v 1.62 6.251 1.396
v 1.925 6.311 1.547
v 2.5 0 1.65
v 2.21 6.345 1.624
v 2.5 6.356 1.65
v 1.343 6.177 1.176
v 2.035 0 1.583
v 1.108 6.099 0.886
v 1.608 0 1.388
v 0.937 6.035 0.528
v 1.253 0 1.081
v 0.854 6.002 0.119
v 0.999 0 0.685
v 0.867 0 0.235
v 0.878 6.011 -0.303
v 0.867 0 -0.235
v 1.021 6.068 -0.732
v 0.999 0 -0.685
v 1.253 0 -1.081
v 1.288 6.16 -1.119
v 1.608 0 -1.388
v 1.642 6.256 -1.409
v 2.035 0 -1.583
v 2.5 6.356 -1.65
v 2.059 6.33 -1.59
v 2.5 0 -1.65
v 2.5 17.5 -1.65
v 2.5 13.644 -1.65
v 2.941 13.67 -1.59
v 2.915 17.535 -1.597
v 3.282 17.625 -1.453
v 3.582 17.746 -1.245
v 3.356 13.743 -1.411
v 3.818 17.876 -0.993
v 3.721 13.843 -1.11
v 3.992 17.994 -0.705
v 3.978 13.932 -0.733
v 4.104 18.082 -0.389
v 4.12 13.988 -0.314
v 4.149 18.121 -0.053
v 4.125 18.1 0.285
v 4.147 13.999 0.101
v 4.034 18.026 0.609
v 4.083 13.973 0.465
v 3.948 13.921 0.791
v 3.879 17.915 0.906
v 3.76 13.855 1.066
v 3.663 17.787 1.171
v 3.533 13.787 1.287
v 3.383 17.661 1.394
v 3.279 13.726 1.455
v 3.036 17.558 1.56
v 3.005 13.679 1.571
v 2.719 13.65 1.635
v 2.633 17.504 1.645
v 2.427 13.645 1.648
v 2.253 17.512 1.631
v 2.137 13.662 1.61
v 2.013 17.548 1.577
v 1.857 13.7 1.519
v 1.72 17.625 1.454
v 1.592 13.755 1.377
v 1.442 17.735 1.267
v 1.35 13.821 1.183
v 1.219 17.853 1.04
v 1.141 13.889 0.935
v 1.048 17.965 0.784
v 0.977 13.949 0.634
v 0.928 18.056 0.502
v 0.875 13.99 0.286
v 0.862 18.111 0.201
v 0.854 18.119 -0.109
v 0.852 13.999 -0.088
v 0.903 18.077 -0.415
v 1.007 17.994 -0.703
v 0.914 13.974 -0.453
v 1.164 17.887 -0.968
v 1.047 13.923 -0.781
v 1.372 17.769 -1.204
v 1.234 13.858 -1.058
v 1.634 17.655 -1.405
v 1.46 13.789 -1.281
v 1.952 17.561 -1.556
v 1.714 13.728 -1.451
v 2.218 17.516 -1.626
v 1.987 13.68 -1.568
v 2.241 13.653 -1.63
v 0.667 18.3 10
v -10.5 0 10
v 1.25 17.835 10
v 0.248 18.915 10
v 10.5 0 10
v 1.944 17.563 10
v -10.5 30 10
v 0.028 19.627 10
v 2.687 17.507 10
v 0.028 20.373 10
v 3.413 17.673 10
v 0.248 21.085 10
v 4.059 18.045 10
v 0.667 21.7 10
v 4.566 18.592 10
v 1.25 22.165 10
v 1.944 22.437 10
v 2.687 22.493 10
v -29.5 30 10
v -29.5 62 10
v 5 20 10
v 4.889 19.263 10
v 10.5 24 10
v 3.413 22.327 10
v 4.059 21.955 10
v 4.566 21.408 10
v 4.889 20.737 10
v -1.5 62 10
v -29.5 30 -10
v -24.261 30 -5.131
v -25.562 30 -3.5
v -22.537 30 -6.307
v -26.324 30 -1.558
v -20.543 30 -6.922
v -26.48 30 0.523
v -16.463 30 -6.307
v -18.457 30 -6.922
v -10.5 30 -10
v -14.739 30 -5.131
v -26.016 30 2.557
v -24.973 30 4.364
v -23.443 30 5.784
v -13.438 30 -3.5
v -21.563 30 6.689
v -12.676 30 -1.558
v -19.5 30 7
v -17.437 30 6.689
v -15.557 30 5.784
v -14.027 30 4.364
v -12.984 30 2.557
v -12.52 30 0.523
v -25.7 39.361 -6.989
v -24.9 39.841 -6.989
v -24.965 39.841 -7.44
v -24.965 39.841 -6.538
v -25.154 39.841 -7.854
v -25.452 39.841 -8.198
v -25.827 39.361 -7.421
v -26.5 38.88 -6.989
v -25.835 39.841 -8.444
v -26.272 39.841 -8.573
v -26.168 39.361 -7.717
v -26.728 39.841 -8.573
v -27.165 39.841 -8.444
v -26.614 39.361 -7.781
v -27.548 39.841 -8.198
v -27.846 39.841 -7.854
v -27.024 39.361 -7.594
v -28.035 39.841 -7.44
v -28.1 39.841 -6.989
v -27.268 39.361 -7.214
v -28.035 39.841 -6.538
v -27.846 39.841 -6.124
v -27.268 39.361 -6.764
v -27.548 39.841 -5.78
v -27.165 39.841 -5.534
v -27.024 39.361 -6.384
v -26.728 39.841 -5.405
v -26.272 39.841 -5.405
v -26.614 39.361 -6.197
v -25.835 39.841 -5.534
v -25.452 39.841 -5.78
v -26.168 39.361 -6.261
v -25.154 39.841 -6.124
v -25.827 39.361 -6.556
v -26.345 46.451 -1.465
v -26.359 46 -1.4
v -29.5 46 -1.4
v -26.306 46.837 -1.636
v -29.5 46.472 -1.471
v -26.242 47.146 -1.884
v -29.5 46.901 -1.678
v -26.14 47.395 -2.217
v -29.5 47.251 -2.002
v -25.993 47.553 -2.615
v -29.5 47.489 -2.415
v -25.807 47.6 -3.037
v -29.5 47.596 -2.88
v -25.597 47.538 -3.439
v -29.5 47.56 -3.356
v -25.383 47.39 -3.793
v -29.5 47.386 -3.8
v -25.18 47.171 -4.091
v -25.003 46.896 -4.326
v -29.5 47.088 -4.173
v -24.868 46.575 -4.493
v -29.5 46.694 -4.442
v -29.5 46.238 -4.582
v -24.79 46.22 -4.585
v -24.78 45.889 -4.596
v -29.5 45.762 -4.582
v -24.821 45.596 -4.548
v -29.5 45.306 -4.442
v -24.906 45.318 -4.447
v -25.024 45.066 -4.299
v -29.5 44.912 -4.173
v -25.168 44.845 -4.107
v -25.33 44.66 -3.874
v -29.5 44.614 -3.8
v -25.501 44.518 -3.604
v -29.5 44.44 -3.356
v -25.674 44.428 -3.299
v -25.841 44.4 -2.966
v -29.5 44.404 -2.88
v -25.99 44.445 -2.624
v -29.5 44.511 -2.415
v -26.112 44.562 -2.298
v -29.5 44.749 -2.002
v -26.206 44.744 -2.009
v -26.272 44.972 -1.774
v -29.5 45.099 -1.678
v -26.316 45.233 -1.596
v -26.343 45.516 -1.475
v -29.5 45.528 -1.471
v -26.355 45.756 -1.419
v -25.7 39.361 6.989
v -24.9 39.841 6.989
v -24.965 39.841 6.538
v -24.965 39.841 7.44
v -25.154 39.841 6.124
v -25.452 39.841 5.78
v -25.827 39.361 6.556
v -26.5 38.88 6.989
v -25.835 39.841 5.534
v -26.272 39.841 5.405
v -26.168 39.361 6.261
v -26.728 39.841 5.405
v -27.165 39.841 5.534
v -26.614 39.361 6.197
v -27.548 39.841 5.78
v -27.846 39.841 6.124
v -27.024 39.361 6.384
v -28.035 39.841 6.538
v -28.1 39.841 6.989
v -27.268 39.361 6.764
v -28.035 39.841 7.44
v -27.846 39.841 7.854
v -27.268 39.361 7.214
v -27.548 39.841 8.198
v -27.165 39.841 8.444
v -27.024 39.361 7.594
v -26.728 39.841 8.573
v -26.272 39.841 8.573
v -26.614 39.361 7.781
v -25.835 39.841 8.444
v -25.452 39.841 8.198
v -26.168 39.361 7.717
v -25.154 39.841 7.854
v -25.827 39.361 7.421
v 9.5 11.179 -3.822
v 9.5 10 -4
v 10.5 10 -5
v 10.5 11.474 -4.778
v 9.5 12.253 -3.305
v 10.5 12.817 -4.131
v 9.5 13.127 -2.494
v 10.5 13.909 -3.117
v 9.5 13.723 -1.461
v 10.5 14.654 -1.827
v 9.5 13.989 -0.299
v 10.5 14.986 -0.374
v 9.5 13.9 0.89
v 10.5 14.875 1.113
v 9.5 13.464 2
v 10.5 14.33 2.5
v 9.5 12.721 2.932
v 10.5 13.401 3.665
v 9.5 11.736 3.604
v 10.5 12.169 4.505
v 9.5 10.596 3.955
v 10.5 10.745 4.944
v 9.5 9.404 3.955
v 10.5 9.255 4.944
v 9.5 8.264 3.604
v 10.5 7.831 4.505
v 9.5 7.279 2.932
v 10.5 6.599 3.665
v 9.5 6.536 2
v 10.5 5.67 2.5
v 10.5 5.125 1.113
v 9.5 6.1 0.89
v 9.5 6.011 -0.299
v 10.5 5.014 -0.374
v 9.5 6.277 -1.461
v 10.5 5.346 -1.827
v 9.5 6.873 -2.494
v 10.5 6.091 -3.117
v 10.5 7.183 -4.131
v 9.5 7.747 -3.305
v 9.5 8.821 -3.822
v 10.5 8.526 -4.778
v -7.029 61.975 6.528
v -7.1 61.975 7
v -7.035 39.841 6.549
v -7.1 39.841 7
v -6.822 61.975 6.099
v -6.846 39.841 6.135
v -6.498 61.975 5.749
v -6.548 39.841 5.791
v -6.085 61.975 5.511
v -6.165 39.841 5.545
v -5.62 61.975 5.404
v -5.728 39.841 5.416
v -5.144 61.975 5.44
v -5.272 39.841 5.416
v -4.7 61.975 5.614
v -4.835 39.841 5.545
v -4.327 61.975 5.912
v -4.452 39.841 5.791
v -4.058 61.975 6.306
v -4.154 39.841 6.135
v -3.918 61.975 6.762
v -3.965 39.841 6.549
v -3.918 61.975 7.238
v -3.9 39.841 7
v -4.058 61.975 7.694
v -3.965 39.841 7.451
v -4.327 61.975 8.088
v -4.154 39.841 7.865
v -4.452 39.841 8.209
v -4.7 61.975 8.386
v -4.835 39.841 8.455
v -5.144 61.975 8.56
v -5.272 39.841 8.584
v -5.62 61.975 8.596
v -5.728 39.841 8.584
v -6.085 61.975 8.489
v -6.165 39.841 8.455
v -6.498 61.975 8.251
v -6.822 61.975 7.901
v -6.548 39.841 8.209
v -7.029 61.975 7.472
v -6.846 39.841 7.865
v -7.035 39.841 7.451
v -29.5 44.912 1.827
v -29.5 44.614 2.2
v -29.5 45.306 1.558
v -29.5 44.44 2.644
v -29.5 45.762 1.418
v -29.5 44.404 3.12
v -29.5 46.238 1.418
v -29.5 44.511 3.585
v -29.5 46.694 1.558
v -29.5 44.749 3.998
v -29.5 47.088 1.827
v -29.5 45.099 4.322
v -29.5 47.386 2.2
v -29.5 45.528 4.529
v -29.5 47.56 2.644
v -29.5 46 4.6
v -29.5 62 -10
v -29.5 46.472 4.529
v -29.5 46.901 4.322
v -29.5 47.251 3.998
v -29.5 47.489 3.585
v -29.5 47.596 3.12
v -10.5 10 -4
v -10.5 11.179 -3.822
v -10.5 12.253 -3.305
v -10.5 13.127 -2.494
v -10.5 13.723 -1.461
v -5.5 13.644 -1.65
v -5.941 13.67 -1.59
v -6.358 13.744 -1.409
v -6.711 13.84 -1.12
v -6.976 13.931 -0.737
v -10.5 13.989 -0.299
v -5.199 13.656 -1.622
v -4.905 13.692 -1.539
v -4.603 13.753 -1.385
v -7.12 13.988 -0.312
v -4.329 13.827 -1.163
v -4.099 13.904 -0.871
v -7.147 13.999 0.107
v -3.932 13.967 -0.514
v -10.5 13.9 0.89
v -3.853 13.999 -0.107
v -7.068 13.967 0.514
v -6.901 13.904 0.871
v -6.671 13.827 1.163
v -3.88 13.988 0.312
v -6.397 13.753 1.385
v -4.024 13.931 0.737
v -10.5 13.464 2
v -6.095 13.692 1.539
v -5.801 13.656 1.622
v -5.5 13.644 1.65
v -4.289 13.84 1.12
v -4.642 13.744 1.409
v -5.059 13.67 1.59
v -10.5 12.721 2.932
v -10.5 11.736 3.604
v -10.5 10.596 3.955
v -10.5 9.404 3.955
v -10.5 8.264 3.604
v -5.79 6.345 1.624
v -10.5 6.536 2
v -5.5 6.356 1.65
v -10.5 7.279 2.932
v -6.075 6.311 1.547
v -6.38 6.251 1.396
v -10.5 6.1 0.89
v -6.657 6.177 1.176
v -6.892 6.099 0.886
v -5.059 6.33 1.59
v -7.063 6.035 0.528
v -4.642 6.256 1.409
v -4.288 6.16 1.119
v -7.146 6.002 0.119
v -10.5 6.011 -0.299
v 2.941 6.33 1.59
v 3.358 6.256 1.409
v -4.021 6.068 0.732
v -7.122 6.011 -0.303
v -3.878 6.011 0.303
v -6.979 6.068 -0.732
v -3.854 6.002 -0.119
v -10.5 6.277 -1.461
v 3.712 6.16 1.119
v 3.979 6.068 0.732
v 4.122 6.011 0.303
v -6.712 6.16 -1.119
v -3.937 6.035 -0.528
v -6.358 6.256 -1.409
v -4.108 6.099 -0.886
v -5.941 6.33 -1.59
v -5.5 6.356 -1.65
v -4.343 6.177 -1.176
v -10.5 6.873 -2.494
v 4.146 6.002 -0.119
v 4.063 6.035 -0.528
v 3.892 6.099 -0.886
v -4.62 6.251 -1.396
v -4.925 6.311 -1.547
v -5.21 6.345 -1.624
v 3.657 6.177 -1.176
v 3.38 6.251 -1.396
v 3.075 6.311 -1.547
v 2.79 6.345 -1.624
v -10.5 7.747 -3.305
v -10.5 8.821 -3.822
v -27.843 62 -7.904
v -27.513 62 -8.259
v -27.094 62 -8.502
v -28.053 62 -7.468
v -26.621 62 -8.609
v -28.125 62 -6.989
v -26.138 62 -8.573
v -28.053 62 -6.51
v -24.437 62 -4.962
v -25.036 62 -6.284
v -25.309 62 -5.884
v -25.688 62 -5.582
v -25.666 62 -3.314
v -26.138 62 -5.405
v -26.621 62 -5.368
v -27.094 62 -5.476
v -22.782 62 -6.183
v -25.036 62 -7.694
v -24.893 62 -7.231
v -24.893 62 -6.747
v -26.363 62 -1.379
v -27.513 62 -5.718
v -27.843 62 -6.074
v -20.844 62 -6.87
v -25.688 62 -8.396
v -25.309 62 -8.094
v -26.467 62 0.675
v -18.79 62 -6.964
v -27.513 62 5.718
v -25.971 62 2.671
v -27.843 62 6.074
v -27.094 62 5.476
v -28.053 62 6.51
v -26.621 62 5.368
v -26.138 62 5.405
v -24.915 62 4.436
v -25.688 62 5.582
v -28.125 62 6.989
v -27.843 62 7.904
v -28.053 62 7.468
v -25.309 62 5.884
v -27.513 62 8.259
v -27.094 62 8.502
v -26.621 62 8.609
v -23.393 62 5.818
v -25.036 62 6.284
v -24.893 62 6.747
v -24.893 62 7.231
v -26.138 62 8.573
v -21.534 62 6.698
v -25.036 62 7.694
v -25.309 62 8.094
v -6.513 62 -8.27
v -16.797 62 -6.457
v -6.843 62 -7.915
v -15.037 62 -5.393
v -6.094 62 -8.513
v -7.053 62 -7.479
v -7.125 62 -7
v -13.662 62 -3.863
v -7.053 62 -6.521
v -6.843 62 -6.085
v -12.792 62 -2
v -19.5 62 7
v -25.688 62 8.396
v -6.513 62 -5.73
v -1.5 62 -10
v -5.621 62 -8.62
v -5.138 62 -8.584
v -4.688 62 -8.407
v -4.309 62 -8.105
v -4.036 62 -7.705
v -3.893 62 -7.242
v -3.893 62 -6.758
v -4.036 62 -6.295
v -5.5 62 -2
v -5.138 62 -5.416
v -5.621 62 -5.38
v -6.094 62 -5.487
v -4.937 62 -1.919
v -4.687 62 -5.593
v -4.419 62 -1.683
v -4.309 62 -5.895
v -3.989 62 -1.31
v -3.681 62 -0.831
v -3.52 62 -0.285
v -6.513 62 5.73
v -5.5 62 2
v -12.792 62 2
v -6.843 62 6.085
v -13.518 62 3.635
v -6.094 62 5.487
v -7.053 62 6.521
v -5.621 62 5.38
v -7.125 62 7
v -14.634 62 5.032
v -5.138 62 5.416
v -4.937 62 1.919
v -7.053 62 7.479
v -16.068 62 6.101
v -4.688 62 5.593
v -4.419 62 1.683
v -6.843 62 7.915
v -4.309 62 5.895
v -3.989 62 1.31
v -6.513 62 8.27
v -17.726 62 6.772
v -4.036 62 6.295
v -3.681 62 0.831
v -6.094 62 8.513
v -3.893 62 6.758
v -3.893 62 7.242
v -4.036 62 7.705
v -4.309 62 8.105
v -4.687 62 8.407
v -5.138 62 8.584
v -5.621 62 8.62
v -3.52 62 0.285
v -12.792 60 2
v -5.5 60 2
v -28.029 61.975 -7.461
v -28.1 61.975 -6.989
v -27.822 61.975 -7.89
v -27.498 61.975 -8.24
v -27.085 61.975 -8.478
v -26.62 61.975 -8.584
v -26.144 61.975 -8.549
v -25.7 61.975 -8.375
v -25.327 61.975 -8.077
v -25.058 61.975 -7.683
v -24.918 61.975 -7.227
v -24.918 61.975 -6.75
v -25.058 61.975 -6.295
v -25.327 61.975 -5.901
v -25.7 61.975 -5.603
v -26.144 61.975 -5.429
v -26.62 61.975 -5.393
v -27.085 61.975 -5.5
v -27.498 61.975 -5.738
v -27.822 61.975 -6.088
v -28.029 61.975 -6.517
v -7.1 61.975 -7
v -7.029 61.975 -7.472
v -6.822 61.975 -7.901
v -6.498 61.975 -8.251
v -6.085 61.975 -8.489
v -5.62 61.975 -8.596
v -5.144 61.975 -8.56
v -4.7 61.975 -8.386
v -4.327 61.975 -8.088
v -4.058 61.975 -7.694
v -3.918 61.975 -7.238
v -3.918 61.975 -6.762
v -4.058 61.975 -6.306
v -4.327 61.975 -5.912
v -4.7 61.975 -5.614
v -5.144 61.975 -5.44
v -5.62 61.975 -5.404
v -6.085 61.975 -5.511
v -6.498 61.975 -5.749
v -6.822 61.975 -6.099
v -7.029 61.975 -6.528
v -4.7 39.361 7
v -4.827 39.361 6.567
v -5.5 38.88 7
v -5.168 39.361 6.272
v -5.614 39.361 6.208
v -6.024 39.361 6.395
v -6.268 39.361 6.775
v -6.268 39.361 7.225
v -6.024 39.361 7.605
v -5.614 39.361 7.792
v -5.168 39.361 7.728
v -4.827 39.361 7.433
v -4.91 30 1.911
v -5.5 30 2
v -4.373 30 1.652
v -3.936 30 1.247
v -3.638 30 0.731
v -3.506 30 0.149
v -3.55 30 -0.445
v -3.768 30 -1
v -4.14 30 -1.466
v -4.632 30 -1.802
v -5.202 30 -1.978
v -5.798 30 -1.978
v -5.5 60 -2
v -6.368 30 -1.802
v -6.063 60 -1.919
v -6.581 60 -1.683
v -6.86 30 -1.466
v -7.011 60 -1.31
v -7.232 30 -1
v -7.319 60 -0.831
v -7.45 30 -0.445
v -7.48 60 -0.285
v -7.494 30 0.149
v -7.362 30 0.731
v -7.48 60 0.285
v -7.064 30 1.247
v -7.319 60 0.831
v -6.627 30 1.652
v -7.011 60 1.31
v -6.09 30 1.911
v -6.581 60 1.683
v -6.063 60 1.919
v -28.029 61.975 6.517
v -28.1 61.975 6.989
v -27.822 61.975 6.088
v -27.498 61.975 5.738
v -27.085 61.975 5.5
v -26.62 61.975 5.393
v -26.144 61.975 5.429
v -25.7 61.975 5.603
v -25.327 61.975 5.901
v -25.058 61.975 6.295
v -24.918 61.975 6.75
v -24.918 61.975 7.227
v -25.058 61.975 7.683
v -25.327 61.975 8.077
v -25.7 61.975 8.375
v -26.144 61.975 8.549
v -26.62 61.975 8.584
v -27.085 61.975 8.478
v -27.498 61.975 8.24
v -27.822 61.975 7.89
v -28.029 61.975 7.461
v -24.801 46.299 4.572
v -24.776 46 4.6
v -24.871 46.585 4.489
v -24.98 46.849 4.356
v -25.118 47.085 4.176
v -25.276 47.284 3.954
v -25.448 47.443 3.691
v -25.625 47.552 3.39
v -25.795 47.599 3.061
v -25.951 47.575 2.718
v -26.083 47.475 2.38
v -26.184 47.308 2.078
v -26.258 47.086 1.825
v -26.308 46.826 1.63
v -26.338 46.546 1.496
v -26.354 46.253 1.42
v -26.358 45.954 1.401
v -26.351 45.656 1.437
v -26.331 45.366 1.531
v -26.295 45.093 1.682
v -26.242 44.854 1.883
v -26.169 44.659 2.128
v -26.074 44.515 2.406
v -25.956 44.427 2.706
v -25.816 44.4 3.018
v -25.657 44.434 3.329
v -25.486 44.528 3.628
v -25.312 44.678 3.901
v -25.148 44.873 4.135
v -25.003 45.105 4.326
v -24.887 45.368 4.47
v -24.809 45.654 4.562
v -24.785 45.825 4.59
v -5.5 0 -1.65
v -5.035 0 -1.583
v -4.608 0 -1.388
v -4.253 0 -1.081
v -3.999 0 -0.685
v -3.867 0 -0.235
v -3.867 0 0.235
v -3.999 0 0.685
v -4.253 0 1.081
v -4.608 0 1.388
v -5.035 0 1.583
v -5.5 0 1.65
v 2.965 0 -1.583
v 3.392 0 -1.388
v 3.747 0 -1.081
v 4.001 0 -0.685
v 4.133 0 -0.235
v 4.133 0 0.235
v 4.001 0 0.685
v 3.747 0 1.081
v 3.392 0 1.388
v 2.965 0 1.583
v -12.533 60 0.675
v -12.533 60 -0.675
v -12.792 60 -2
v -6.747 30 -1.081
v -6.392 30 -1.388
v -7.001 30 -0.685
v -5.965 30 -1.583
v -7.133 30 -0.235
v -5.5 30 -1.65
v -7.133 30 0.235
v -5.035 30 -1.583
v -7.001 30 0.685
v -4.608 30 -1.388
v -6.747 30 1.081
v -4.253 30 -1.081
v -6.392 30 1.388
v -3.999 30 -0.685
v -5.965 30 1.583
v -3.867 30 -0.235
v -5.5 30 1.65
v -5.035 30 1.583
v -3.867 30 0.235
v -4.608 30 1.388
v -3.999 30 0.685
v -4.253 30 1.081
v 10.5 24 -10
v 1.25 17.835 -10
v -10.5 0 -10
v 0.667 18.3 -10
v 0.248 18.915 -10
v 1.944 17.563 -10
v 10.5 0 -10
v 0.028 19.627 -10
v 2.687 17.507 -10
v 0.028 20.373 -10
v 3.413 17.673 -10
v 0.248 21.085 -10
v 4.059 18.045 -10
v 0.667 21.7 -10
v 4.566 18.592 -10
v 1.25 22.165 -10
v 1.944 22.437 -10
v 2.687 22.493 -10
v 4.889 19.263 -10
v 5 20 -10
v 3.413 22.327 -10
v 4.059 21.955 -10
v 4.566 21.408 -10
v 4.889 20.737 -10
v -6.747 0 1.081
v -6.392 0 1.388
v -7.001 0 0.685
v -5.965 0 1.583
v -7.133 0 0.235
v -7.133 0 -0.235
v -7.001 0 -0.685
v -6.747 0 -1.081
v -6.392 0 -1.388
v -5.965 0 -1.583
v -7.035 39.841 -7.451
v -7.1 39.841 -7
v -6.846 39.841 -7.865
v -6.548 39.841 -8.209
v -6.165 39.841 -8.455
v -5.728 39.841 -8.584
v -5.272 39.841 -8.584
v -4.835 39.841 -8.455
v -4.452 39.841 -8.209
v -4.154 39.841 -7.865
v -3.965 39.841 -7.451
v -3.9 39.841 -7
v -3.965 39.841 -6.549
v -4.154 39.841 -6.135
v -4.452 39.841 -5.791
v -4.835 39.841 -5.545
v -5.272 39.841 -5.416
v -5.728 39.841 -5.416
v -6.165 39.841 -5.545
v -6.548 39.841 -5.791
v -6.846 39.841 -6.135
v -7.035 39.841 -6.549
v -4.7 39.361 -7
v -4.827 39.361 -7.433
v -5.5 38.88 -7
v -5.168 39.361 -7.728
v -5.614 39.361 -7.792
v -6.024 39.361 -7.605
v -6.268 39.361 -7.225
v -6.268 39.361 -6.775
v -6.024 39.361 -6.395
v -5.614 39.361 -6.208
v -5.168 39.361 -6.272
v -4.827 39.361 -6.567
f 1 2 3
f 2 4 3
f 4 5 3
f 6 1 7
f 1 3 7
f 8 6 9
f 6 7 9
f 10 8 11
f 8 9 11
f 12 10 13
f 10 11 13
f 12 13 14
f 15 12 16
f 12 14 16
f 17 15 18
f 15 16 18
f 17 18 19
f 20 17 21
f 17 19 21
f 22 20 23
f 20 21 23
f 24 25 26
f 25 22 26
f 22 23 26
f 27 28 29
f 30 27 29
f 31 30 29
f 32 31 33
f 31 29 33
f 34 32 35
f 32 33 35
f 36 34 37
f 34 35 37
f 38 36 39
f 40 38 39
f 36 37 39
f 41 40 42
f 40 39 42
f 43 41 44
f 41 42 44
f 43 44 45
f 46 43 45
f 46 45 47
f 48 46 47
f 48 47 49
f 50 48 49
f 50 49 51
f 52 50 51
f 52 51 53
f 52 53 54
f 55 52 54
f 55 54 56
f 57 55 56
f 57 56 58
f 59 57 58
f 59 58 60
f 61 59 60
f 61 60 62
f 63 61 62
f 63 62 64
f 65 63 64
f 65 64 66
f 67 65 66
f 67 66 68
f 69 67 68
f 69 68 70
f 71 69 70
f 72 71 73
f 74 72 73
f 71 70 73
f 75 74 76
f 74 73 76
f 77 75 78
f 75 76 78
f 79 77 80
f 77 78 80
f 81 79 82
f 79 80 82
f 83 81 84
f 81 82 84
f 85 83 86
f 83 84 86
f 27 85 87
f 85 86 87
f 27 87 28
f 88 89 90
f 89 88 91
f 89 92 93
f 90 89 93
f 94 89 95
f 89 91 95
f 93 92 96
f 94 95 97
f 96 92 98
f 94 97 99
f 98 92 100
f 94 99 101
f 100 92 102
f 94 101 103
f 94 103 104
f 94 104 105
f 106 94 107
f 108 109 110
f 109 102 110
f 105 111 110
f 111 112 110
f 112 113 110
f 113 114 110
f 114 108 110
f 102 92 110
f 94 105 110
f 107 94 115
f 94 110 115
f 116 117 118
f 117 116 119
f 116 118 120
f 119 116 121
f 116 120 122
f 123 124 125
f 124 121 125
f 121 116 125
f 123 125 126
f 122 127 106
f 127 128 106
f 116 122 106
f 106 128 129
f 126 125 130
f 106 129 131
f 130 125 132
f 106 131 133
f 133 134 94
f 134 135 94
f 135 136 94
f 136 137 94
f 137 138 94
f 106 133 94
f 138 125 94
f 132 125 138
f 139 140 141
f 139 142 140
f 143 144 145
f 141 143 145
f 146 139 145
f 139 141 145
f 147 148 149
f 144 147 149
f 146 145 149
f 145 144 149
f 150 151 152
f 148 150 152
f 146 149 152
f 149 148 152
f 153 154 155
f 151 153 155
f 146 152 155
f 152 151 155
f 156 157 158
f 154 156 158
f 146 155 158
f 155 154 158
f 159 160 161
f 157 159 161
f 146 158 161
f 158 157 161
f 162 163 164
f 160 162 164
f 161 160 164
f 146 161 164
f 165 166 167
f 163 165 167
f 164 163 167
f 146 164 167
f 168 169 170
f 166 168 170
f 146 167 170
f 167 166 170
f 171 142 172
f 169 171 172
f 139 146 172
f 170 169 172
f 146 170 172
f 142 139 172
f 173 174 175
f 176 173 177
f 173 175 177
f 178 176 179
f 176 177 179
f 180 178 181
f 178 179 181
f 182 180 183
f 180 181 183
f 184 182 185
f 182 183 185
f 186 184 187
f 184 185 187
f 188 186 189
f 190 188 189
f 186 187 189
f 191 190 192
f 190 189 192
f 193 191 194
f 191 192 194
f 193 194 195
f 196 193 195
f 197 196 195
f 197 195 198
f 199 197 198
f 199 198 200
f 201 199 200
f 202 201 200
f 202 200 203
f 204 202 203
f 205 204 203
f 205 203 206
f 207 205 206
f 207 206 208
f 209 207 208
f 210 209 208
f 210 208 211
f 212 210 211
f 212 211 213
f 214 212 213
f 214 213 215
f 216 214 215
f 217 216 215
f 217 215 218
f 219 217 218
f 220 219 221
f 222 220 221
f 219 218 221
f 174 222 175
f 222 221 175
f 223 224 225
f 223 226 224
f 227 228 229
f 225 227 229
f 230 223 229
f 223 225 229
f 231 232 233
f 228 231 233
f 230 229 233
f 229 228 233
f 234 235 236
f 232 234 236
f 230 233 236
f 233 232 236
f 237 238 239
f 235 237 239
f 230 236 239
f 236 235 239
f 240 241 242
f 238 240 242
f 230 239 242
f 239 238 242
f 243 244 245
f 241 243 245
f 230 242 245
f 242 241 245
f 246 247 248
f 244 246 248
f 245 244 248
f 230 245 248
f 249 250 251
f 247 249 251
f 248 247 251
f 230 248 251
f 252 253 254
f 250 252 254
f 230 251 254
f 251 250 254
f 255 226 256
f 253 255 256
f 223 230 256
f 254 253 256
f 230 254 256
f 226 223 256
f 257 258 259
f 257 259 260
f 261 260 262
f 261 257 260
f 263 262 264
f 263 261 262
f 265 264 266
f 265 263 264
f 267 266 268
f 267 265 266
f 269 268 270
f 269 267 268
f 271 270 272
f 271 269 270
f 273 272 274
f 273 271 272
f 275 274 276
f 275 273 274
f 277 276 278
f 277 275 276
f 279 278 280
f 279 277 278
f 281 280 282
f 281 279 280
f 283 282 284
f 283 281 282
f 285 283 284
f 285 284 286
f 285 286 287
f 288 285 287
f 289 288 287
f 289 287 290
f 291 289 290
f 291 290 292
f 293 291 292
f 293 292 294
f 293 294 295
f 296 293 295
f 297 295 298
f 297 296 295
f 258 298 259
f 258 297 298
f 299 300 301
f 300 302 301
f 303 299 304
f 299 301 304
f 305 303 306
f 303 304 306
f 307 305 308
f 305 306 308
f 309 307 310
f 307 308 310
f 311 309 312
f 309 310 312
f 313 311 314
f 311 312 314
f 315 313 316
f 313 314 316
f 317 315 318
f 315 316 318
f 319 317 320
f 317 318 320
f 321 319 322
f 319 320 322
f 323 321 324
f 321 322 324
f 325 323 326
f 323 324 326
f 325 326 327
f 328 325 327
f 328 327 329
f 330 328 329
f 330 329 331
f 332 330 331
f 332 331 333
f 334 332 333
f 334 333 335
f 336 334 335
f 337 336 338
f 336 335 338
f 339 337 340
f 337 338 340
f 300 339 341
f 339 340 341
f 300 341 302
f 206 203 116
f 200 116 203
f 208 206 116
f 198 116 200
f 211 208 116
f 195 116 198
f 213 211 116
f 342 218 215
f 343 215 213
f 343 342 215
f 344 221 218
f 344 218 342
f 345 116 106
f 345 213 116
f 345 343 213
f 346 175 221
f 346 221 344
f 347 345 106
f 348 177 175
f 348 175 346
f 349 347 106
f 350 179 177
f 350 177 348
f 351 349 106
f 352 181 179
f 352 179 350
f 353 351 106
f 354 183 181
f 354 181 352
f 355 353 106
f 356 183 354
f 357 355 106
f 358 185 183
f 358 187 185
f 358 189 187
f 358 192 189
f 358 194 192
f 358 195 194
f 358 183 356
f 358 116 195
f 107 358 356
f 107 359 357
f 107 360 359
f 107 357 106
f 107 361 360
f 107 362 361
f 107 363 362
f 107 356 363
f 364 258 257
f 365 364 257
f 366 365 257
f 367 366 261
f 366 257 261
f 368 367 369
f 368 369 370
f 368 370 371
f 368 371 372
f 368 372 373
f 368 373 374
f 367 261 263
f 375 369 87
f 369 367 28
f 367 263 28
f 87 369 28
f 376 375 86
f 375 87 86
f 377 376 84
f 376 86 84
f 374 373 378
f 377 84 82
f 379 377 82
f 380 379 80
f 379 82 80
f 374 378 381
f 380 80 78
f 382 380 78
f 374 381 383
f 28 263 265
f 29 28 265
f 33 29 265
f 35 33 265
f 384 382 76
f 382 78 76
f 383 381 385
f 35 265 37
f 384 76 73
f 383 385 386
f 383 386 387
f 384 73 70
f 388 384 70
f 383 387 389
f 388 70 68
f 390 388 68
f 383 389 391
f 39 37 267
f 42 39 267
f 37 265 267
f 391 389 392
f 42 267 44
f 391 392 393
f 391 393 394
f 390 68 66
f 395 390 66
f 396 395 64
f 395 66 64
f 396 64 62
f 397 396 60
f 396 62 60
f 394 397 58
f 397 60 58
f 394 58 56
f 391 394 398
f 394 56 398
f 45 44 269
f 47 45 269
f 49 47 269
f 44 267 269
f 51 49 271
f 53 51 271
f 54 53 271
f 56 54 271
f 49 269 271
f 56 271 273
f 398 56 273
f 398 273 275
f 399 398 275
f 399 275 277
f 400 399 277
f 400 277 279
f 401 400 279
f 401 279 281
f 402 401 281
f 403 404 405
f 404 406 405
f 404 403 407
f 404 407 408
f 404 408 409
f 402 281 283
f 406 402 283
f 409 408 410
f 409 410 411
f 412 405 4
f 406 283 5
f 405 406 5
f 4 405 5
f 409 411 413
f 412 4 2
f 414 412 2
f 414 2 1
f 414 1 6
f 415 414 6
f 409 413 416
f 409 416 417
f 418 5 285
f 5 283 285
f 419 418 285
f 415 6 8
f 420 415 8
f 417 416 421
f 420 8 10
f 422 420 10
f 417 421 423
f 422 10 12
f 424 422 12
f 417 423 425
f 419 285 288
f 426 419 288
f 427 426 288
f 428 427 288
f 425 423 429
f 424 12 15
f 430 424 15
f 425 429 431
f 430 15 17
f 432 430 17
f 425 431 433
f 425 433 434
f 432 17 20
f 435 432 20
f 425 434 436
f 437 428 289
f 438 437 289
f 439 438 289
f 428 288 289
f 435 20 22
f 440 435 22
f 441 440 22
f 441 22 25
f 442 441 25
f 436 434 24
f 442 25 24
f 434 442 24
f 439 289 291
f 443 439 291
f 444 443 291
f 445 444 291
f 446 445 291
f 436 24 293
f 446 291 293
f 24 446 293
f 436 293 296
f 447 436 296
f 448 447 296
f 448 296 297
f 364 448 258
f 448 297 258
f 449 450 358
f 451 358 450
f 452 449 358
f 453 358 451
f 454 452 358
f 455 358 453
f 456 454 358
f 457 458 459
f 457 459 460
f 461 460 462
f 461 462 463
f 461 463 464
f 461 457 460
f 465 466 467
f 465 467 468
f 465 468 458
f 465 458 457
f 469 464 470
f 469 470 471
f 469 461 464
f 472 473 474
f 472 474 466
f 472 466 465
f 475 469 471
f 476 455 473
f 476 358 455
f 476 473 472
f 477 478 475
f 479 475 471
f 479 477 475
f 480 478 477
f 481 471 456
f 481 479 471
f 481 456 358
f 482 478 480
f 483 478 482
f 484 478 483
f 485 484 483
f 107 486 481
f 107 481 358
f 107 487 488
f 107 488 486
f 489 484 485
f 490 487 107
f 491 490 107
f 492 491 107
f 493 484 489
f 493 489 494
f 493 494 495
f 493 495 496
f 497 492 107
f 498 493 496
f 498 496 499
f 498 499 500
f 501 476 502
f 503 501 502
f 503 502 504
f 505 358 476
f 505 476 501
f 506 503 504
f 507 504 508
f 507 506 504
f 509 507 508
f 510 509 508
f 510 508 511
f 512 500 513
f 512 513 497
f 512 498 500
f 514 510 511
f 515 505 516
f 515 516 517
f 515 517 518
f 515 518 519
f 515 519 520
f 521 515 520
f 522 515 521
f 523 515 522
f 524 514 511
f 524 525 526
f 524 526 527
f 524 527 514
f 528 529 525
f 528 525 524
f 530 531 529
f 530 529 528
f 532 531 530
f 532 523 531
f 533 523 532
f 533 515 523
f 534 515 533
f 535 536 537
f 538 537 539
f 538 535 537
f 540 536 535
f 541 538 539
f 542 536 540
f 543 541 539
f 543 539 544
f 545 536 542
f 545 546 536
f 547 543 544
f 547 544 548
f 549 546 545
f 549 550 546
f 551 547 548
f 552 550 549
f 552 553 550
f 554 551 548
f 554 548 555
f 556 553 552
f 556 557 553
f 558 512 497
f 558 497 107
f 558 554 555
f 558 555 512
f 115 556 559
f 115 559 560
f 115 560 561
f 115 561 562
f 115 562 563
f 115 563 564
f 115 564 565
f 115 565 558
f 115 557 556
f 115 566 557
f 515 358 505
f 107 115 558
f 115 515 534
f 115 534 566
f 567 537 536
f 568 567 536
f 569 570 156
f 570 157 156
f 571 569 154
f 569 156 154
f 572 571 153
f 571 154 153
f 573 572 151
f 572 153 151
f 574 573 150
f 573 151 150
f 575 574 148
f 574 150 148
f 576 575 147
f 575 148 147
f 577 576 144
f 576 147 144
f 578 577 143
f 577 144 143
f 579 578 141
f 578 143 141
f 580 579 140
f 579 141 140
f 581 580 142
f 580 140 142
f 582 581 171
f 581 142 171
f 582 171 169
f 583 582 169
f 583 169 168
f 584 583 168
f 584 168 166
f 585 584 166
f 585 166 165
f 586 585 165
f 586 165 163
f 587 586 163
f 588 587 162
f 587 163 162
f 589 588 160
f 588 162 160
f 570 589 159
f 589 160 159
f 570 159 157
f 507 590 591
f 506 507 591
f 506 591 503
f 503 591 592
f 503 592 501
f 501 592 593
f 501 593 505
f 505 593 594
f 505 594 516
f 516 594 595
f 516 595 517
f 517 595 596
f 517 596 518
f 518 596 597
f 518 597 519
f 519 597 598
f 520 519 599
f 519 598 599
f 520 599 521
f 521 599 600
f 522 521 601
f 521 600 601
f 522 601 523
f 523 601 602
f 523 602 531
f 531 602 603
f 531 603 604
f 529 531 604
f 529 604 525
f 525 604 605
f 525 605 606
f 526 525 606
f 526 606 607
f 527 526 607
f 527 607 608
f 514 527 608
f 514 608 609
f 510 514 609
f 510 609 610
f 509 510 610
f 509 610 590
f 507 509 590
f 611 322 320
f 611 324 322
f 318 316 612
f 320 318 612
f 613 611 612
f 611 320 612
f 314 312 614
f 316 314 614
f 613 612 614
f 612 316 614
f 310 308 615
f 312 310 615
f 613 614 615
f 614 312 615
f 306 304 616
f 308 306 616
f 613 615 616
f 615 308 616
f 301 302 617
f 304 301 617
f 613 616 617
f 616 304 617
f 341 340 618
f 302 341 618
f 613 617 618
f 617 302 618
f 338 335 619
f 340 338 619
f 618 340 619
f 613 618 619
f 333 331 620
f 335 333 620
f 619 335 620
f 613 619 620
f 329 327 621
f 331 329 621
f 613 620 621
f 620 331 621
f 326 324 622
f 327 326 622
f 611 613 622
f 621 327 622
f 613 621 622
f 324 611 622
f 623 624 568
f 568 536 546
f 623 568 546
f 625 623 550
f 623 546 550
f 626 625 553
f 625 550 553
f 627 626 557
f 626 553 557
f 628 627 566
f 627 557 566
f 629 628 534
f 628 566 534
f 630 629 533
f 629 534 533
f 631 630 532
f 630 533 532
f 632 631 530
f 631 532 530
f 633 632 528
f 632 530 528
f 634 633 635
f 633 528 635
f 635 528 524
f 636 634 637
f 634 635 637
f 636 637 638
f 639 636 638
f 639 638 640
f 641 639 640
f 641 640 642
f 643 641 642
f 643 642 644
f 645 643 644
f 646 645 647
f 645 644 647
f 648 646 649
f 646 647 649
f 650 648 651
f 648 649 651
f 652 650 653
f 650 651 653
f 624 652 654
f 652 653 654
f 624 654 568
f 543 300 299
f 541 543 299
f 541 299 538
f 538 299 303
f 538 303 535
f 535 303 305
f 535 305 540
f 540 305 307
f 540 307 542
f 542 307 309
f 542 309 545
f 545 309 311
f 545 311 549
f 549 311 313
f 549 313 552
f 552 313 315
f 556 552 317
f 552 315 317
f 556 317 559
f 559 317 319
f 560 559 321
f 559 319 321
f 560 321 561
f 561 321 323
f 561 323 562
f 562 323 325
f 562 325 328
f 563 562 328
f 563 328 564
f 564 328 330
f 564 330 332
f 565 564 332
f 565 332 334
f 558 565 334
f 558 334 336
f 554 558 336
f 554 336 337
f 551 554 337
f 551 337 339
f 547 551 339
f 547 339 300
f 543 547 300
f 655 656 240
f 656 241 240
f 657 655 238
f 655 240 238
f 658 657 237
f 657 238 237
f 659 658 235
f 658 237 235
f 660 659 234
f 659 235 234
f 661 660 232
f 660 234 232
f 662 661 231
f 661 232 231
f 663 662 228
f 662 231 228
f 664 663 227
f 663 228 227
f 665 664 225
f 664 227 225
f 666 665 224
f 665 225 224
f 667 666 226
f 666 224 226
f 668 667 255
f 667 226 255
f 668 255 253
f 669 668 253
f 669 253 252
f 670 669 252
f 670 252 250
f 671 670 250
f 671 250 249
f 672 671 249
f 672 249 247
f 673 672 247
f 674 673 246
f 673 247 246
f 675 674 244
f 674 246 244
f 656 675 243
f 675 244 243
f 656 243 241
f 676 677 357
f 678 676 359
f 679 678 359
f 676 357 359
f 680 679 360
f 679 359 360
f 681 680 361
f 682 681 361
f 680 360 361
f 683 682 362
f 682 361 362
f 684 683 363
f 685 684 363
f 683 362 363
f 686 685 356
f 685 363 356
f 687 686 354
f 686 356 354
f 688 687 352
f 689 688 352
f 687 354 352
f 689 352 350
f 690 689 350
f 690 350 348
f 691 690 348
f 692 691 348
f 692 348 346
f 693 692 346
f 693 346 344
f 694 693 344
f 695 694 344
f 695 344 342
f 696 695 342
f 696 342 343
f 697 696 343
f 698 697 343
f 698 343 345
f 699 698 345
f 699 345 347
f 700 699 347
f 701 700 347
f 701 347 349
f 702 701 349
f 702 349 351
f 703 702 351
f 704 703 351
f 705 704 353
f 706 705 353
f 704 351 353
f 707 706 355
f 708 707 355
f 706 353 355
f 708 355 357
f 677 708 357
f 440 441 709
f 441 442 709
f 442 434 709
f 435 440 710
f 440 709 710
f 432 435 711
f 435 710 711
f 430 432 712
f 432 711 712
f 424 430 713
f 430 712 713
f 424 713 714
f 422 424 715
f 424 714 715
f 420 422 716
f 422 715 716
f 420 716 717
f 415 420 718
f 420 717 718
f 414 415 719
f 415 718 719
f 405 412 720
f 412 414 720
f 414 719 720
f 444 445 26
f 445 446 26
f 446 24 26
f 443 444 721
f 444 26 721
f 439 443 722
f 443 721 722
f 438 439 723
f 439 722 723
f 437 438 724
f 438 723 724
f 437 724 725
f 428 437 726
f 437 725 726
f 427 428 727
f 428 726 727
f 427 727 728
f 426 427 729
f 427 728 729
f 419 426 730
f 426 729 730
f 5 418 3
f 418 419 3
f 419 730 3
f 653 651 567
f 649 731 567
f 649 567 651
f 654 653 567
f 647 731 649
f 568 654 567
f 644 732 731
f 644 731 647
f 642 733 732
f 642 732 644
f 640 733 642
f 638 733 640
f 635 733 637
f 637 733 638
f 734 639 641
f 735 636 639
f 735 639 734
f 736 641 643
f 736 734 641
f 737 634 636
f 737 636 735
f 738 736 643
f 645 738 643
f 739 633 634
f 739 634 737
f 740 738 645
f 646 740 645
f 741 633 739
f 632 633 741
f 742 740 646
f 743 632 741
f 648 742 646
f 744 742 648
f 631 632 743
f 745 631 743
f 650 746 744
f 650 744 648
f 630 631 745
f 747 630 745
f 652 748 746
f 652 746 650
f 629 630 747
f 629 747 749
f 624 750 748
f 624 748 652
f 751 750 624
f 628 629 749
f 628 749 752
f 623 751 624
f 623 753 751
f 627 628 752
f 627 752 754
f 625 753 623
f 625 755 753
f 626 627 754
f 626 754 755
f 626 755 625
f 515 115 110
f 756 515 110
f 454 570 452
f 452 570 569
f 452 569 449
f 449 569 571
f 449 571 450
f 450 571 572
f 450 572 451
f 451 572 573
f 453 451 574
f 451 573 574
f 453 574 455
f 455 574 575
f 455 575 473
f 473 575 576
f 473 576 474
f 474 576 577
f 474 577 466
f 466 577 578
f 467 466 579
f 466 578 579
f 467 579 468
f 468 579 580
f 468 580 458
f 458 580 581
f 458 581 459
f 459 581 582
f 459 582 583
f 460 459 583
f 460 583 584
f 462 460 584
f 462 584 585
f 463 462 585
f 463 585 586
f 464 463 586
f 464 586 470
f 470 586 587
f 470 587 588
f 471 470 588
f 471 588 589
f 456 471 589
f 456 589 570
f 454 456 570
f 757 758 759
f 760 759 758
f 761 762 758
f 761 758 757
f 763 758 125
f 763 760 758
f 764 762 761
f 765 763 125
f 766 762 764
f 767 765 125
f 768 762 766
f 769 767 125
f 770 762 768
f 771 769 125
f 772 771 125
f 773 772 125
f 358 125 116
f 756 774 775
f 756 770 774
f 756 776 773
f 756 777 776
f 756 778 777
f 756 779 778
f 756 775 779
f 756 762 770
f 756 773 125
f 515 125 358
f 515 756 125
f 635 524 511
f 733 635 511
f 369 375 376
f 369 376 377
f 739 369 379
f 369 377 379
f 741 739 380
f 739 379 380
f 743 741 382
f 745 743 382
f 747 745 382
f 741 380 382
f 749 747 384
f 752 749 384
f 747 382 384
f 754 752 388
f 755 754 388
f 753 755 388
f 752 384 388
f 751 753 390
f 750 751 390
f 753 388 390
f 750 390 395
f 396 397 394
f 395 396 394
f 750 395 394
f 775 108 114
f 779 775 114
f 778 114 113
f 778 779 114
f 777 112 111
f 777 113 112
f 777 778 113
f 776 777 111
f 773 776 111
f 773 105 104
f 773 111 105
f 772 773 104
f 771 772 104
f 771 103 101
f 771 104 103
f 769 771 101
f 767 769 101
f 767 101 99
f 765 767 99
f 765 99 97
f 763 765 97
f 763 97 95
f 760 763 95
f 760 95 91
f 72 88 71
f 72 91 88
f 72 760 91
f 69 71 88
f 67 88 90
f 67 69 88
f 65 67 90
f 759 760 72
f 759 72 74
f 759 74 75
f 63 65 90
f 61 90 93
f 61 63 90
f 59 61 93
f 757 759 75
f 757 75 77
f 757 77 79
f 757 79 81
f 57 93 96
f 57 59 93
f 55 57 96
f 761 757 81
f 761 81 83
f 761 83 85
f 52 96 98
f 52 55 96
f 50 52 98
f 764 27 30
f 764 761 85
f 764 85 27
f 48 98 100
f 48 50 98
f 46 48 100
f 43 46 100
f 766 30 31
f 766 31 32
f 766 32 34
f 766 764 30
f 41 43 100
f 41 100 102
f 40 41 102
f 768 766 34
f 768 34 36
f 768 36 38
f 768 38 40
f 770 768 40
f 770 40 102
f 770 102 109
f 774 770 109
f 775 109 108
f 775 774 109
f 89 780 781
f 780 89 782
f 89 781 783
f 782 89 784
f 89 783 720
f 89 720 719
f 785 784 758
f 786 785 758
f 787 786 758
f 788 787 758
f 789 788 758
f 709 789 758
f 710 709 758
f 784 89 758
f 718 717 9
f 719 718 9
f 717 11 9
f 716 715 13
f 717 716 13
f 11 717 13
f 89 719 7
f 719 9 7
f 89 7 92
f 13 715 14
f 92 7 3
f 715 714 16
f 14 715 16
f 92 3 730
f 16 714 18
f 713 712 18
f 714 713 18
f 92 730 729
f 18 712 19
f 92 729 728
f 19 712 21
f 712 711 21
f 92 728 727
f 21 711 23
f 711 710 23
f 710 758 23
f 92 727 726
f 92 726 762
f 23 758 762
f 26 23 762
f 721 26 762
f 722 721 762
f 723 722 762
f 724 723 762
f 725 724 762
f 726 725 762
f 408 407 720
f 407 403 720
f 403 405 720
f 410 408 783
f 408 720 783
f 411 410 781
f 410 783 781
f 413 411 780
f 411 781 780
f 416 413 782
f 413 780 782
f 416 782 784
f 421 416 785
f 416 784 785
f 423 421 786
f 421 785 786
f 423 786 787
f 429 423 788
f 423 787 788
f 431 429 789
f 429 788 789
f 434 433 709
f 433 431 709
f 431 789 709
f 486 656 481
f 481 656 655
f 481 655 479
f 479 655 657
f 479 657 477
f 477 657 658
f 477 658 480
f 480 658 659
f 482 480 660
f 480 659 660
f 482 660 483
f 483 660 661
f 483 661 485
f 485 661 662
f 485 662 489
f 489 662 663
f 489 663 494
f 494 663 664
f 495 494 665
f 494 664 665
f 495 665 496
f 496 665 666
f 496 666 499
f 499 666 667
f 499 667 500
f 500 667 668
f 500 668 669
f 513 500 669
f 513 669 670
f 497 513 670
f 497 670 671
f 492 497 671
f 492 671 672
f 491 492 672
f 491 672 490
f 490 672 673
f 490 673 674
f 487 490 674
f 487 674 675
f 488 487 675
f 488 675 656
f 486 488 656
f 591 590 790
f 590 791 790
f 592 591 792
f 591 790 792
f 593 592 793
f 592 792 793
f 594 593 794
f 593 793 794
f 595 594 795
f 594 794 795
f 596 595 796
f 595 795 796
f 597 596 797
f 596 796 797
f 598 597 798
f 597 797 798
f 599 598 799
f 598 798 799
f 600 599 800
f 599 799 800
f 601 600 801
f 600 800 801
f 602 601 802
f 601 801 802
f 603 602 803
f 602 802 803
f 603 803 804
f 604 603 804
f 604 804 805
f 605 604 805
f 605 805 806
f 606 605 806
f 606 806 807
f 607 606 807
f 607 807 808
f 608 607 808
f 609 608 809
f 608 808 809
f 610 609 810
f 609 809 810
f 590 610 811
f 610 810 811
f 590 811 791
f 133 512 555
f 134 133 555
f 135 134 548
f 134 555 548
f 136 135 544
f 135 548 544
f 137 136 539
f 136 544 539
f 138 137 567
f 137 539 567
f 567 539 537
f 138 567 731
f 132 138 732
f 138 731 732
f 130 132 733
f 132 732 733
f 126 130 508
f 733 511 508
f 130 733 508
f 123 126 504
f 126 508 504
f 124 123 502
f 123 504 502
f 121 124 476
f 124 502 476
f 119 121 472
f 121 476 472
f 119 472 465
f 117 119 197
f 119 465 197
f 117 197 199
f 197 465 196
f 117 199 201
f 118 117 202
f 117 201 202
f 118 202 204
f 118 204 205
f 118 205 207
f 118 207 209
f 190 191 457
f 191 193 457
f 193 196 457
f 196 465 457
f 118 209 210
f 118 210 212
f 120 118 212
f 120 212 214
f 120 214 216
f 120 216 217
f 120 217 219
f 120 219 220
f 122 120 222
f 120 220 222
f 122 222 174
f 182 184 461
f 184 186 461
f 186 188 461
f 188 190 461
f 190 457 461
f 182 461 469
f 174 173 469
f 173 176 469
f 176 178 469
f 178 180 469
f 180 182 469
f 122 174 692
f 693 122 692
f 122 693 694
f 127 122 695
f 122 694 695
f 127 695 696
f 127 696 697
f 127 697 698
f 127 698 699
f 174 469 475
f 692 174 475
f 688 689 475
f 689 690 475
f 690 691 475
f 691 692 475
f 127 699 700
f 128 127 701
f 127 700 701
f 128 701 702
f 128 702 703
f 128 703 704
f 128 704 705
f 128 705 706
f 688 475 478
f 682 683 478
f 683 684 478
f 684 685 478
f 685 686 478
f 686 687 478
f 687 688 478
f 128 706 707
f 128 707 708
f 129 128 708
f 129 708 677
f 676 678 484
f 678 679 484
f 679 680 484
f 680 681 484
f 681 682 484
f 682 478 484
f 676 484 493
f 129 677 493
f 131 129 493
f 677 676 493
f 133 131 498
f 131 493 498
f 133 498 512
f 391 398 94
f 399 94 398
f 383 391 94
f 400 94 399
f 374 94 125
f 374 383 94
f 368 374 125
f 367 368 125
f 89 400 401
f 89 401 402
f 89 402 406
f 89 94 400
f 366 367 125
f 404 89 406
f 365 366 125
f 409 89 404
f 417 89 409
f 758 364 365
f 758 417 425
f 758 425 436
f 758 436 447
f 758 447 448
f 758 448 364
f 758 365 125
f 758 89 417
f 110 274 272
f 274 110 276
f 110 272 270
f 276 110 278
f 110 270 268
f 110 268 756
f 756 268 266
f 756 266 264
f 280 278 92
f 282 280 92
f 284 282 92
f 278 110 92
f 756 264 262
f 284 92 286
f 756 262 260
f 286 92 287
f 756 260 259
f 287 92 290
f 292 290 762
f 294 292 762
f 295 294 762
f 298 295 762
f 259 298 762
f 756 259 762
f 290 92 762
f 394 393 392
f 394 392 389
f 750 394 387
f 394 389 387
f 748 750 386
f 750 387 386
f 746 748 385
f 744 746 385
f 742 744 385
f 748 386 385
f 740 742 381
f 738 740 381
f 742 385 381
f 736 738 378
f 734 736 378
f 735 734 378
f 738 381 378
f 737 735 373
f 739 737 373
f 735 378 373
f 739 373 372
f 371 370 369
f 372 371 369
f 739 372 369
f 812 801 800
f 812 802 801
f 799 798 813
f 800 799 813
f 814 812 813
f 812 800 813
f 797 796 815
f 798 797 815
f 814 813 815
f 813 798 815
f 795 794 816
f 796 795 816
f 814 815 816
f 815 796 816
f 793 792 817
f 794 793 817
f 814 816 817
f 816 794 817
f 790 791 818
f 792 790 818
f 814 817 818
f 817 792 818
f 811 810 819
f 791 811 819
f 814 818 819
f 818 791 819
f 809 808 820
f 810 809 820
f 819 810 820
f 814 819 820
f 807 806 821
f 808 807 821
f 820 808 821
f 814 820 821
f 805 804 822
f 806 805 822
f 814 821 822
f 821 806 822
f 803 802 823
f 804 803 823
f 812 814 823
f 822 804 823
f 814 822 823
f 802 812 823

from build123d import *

# Parameters (mm, degrees)
SKETCH1_W                      = 21
SKETCH1_H                      = 20
BOSS_EXTRUDE2_DEPTH            = 62
CUT_EXTRUDE1_DEPTH             = 62
SKETCH4_W                      = 20
SKETCH4_H                      = 32
BOSS_EXTRUDE3_DEPTH            = 19
SKETCH7_R                      = 7
CUT_EXTRUDE2_DEPTH             = 47
SKETCH8_R                      = 4
CUT_EXTRUDE3_DEPTH             = 47
M3_CLEARANCE_HOLE1_D           = 3.2
M3_CLEARANCE_HOLE1_DEPTH       = 22.15862301
M3_CLEARANCE_HOLE1_CSINK_D     = 3.25
M3_CLEARANCE_HOLE1_CSINK_ANGLE = 90
M3_CLEARANCE_HOLE1_TIP         = 0.96137699
CUT_EXTRUDE7_DEPTH             = 72.513984646
CUT_EXTRUDE7_DEPTH_BACK        = 72.513984646
SKETCH14_R                     = 2.5
CHAMFER1_SIZE                  = 1
CUT_EXTRUDE8_DEPTH             = 2
HOLE1_D                        = 2.5
HOLE1_DEPTH                    = 100
SKETCH18_R                     = 2
CUT_EXTRUDE10_DEPTH            = 30
SKETCH19_R                     = 1.6
CUT_EXTRUDE11_DEPTH            = 13
CUT_EXTRUDE12_REACH            = 71.385
CUT_EXTRUDE12_END_RADIUS       = 2.5
SKETCH24_R                     = 1.65


with BuildPart() as part:
    # Sketch1 → Boss-Extrude2 (new body)
    with BuildSketch(Plane(origin=(0, 0, 0), x_dir=(1, 0, 0), z_dir=(0, 1, 0))):
        Rectangle(SKETCH1_W, SKETCH1_H)
    extrude(amount=BOSS_EXTRUDE2_DEPTH)

    # Sketch3 → Cut-Extrude1 (cut)
    with BuildSketch(Plane.XY.offset(10)):
        Polygon((10.5, 62), (-1.5, 62), (10.5, 24), align=None)
    extrude(amount=-CUT_EXTRUDE1_DEPTH, mode=Mode.SUBTRACT)

    # Sketch4 → Boss-Extrude3 (add)
    with BuildSketch(Plane.ZY.offset(10.5)):
        with Locations((0, 46)):
            Rectangle(SKETCH4_W, SKETCH4_H)
    extrude(amount=BOSS_EXTRUDE3_DEPTH)

    # Sketch7 → Cut-Extrude2 (cut)
    with BuildSketch(Plane(origin=(0, 62, 0), x_dir=(1, 0, 0), z_dir=(0, 1, 0))):
        with Locations(Location((-19.5, 0, 0), (0, 0, 270))):
            Circle(SKETCH7_R)
    extrude(amount=-CUT_EXTRUDE2_DEPTH, mode=Mode.SUBTRACT)

    # Sketch8 → Cut-Extrude3 (cut)
    with BuildSketch(Plane(origin=(10.5, 0, 0), x_dir=(0, 0, -1), z_dir=(1, 0, 0))):
        with Locations((0, 10)):
            Circle(SKETCH8_R)
    extrude(amount=-CUT_EXTRUDE3_DEPTH, mode=Mode.SUBTRACT)

    # M3 Clearance Hole1
    with Locations(Plane(origin=(0, 62, 0), x_dir=(1, 0, 0), z_dir=(0, 1, 0))):
        with Locations((-26.5, 6.988952109), (-26.5, -6.988952109), (-5.5, -7), (-5.5, 7)):
            CounterSinkHole(M3_CLEARANCE_HOLE1_D / 2, M3_CLEARANCE_HOLE1_CSINK_D / 2, depth=M3_CLEARANCE_HOLE1_DEPTH, counter_sink_angle=M3_CLEARANCE_HOLE1_CSINK_ANGLE)
            with Locations((0, 0, -(M3_CLEARANCE_HOLE1_DEPTH + M3_CLEARANCE_HOLE1_TIP / 2))):  # 118° drill point
                Cone(0, M3_CLEARANCE_HOLE1_D / 2, M3_CLEARANCE_HOLE1_TIP, mode=Mode.SUBTRACT)

    # Sketch14 → Cut-Extrude7 (cut, two sides: drawn at the far end of the back side and taken through both)
    with BuildSketch(Plane.XY.offset(10).offset(-CUT_EXTRUDE7_DEPTH_BACK)):
        with Locations((2.5, 20)):
            Circle(SKETCH14_R)
    extrude(amount=CUT_EXTRUDE7_DEPTH + CUT_EXTRUDE7_DEPTH_BACK, mode=Mode.SUBTRACT)

    # Chamfer1
    chamfer1_edges = [part.edges().sort_by_distance(p)[0] for p in [
        (10.5, 10, 4),
    ]]
    chamfer(chamfer1_edges, length=CHAMFER1_SIZE)

    # Sketch15 → Cut-Extrude8 (cut)
    with BuildSketch(Plane(origin=(0, 62, 0), x_dir=(1, 0, 0), z_dir=(0, 1, 0))):
        with BuildLine():
            Line((-5.5, 2), (-14.947436463, 2))
            Line((-14.947436463, 2), (-14.947436463, -2))
            Line((-14.947436463, -2), (-5.5, -2))
            ThreePointArc((-5.5, -2), (-3.5, 0), (-5.5, 2))
        make_face()
    extrude(amount=-CUT_EXTRUDE8_DEPTH, mode=Mode.SUBTRACT)

    # Hole1
    with Locations(Plane(origin=(0, 60, 0), x_dir=(1, 0, 0), z_dir=(0, 1, 0))):
        with Locations((-5.231662338, 0)):
            Hole(HOLE1_D / 2, depth=HOLE1_DEPTH)

    # Sketch18 → Cut-Extrude10 (cut)
    with BuildSketch(Plane(origin=(0, 60, 0), x_dir=(1, 0, 0), z_dir=(0, 1, 0))):
        with Locations(Location((-5.5, 0, 0), (0, 0, 270))):
            Circle(SKETCH18_R)
    extrude(amount=-CUT_EXTRUDE10_DEPTH, mode=Mode.SUBTRACT)

    # Sketch19 → Cut-Extrude11 (cut)
    with BuildSketch(Plane.ZY.offset(29.5)):
        with Locations((-3, 46)):
            Circle(SKETCH19_R)
        with Locations((3, 46)):
            Circle(SKETCH19_R)
    extrude(amount=-CUT_EXTRUDE11_DEPTH, mode=Mode.SUBTRACT)

    # M4 Tapped Hole1: read off the stored shape, not the designer's step
    # M4 Tapped Hole1: loft between two sections, ruled curve by curve
    m4_tapped_hole1_from = [
        Edge.make_three_point_arc((-5.5, 6.356330866, -1.65), (-3.85, 6.356330866, 0), (-5.5, 6.356330866, 1.65)),
        Edge.make_three_point_arc((-5.5, 6.356330866, 1.65), (-7.15, 6.356330866, 0), (-5.5, 6.356330866, -1.65)),
    ]
    m4_tapped_hole1_to = [
        Edge.make_three_point_arc((-5.5, 0, -1.65), (-3.85, 0, 0), (-5.5, 0, 1.65)),
        Edge.make_three_point_arc((-5.5, 0, 1.65), (-7.15, 0, 0), (-5.5, 0, -1.65)),
    ]
    m4_tapped_hole1 = Solid(Shell([*[Face.make_surface_from_curves(m4_tapped_hole1_from[k], m4_tapped_hole1_to[k]) for k in range(2)], Face(Wire(m4_tapped_hole1_from)), Face(Wire(m4_tapped_hole1_to))]))
    add(m4_tapped_hole1, mode=Mode.SUBTRACT)

    # M4 Tapped Hole1 2: loft between two sections, ruled curve by curve
    m4_tapped_hole1_2_from = [
        Edge.make_three_point_arc((-5.5, 30, -1.65), (-3.85, 30, 0), (-5.5, 30, 1.65)),
        Edge.make_three_point_arc((-5.5, 30, 1.65), (-7.15, 30, 0), (-5.5, 30, -1.65)),
    ]
    m4_tapped_hole1_2_to = [
        Edge.make_three_point_arc((-5.5, 13.643669134, -1.65), (-3.85, 13.643669134, 0), (-5.5, 13.643669134, 1.65)),
        Edge.make_three_point_arc((-5.5, 13.643669134, 1.65), (-7.15, 13.643669134, 0), (-5.5, 13.643669134, -1.65)),
    ]
    m4_tapped_hole1_2 = Solid(Shell([*[Face.make_surface_from_curves(m4_tapped_hole1_2_from[k], m4_tapped_hole1_2_to[k]) for k in range(2)], Face(Wire(m4_tapped_hole1_2_from)), Face(Wire(m4_tapped_hole1_2_to))]))
    add(m4_tapped_hole1_2, mode=Mode.SUBTRACT)

    # M4 Tapped Hole1 3: loft between two sections, ruled curve by curve
    m4_tapped_hole1_3_from = [
        Edge.make_three_point_arc((2.5, 6.356330866, -1.65), (4.15, 6.356330866, 0), (2.5, 6.356330866, 1.65)),
        Edge.make_three_point_arc((2.5, 6.356330866, 1.65), (0.85, 6.356330866, 0), (2.5, 6.356330866, -1.65)),
    ]
    m4_tapped_hole1_3_to = [
        Edge.make_three_point_arc((2.5, 0, -1.65), (4.15, 0, 0), (2.5, 0, 1.65)),
        Edge.make_three_point_arc((2.5, 0, 1.65), (0.85, 0, 0), (2.5, 0, -1.65)),
    ]
    m4_tapped_hole1_3 = Solid(Shell([*[Face.make_surface_from_curves(m4_tapped_hole1_3_from[k], m4_tapped_hole1_3_to[k]) for k in range(2)], Face(Wire(m4_tapped_hole1_3_from)), Face(Wire(m4_tapped_hole1_3_to))]))
    add(m4_tapped_hole1_3, mode=Mode.SUBTRACT)

    # Cut-Extrude12: up to this cylinder (the profile starts outside it)
    cut_extrude12_end = Plane(origin=(2.5, 20, 0), z_dir=(0, 0, 1)) * Cylinder(CUT_EXTRUDE12_END_RADIUS, 148.77, mode=Mode.PRIVATE)
    # Sketch24 → Cut-Extrude12 (cut, up to the surface)
    with BuildSketch(Plane.XZ, mode=Mode.PRIVATE) as cut_extrude12_sk1:
        with Locations(Location((2.5, 0, 0), (0, 0, 270))):
            Circle(SKETCH24_R)
    cut_extrude12_tool1 = extrude(cut_extrude12_sk1.sketch, amount=-CUT_EXTRUDE12_REACH, mode=Mode.PRIVATE) - cut_extrude12_end
    add(cut_extrude12_tool1.solids().sort_by_distance((2.5, 0, 0))[0], mode=Mode.SUBTRACT)


solid = part.part
